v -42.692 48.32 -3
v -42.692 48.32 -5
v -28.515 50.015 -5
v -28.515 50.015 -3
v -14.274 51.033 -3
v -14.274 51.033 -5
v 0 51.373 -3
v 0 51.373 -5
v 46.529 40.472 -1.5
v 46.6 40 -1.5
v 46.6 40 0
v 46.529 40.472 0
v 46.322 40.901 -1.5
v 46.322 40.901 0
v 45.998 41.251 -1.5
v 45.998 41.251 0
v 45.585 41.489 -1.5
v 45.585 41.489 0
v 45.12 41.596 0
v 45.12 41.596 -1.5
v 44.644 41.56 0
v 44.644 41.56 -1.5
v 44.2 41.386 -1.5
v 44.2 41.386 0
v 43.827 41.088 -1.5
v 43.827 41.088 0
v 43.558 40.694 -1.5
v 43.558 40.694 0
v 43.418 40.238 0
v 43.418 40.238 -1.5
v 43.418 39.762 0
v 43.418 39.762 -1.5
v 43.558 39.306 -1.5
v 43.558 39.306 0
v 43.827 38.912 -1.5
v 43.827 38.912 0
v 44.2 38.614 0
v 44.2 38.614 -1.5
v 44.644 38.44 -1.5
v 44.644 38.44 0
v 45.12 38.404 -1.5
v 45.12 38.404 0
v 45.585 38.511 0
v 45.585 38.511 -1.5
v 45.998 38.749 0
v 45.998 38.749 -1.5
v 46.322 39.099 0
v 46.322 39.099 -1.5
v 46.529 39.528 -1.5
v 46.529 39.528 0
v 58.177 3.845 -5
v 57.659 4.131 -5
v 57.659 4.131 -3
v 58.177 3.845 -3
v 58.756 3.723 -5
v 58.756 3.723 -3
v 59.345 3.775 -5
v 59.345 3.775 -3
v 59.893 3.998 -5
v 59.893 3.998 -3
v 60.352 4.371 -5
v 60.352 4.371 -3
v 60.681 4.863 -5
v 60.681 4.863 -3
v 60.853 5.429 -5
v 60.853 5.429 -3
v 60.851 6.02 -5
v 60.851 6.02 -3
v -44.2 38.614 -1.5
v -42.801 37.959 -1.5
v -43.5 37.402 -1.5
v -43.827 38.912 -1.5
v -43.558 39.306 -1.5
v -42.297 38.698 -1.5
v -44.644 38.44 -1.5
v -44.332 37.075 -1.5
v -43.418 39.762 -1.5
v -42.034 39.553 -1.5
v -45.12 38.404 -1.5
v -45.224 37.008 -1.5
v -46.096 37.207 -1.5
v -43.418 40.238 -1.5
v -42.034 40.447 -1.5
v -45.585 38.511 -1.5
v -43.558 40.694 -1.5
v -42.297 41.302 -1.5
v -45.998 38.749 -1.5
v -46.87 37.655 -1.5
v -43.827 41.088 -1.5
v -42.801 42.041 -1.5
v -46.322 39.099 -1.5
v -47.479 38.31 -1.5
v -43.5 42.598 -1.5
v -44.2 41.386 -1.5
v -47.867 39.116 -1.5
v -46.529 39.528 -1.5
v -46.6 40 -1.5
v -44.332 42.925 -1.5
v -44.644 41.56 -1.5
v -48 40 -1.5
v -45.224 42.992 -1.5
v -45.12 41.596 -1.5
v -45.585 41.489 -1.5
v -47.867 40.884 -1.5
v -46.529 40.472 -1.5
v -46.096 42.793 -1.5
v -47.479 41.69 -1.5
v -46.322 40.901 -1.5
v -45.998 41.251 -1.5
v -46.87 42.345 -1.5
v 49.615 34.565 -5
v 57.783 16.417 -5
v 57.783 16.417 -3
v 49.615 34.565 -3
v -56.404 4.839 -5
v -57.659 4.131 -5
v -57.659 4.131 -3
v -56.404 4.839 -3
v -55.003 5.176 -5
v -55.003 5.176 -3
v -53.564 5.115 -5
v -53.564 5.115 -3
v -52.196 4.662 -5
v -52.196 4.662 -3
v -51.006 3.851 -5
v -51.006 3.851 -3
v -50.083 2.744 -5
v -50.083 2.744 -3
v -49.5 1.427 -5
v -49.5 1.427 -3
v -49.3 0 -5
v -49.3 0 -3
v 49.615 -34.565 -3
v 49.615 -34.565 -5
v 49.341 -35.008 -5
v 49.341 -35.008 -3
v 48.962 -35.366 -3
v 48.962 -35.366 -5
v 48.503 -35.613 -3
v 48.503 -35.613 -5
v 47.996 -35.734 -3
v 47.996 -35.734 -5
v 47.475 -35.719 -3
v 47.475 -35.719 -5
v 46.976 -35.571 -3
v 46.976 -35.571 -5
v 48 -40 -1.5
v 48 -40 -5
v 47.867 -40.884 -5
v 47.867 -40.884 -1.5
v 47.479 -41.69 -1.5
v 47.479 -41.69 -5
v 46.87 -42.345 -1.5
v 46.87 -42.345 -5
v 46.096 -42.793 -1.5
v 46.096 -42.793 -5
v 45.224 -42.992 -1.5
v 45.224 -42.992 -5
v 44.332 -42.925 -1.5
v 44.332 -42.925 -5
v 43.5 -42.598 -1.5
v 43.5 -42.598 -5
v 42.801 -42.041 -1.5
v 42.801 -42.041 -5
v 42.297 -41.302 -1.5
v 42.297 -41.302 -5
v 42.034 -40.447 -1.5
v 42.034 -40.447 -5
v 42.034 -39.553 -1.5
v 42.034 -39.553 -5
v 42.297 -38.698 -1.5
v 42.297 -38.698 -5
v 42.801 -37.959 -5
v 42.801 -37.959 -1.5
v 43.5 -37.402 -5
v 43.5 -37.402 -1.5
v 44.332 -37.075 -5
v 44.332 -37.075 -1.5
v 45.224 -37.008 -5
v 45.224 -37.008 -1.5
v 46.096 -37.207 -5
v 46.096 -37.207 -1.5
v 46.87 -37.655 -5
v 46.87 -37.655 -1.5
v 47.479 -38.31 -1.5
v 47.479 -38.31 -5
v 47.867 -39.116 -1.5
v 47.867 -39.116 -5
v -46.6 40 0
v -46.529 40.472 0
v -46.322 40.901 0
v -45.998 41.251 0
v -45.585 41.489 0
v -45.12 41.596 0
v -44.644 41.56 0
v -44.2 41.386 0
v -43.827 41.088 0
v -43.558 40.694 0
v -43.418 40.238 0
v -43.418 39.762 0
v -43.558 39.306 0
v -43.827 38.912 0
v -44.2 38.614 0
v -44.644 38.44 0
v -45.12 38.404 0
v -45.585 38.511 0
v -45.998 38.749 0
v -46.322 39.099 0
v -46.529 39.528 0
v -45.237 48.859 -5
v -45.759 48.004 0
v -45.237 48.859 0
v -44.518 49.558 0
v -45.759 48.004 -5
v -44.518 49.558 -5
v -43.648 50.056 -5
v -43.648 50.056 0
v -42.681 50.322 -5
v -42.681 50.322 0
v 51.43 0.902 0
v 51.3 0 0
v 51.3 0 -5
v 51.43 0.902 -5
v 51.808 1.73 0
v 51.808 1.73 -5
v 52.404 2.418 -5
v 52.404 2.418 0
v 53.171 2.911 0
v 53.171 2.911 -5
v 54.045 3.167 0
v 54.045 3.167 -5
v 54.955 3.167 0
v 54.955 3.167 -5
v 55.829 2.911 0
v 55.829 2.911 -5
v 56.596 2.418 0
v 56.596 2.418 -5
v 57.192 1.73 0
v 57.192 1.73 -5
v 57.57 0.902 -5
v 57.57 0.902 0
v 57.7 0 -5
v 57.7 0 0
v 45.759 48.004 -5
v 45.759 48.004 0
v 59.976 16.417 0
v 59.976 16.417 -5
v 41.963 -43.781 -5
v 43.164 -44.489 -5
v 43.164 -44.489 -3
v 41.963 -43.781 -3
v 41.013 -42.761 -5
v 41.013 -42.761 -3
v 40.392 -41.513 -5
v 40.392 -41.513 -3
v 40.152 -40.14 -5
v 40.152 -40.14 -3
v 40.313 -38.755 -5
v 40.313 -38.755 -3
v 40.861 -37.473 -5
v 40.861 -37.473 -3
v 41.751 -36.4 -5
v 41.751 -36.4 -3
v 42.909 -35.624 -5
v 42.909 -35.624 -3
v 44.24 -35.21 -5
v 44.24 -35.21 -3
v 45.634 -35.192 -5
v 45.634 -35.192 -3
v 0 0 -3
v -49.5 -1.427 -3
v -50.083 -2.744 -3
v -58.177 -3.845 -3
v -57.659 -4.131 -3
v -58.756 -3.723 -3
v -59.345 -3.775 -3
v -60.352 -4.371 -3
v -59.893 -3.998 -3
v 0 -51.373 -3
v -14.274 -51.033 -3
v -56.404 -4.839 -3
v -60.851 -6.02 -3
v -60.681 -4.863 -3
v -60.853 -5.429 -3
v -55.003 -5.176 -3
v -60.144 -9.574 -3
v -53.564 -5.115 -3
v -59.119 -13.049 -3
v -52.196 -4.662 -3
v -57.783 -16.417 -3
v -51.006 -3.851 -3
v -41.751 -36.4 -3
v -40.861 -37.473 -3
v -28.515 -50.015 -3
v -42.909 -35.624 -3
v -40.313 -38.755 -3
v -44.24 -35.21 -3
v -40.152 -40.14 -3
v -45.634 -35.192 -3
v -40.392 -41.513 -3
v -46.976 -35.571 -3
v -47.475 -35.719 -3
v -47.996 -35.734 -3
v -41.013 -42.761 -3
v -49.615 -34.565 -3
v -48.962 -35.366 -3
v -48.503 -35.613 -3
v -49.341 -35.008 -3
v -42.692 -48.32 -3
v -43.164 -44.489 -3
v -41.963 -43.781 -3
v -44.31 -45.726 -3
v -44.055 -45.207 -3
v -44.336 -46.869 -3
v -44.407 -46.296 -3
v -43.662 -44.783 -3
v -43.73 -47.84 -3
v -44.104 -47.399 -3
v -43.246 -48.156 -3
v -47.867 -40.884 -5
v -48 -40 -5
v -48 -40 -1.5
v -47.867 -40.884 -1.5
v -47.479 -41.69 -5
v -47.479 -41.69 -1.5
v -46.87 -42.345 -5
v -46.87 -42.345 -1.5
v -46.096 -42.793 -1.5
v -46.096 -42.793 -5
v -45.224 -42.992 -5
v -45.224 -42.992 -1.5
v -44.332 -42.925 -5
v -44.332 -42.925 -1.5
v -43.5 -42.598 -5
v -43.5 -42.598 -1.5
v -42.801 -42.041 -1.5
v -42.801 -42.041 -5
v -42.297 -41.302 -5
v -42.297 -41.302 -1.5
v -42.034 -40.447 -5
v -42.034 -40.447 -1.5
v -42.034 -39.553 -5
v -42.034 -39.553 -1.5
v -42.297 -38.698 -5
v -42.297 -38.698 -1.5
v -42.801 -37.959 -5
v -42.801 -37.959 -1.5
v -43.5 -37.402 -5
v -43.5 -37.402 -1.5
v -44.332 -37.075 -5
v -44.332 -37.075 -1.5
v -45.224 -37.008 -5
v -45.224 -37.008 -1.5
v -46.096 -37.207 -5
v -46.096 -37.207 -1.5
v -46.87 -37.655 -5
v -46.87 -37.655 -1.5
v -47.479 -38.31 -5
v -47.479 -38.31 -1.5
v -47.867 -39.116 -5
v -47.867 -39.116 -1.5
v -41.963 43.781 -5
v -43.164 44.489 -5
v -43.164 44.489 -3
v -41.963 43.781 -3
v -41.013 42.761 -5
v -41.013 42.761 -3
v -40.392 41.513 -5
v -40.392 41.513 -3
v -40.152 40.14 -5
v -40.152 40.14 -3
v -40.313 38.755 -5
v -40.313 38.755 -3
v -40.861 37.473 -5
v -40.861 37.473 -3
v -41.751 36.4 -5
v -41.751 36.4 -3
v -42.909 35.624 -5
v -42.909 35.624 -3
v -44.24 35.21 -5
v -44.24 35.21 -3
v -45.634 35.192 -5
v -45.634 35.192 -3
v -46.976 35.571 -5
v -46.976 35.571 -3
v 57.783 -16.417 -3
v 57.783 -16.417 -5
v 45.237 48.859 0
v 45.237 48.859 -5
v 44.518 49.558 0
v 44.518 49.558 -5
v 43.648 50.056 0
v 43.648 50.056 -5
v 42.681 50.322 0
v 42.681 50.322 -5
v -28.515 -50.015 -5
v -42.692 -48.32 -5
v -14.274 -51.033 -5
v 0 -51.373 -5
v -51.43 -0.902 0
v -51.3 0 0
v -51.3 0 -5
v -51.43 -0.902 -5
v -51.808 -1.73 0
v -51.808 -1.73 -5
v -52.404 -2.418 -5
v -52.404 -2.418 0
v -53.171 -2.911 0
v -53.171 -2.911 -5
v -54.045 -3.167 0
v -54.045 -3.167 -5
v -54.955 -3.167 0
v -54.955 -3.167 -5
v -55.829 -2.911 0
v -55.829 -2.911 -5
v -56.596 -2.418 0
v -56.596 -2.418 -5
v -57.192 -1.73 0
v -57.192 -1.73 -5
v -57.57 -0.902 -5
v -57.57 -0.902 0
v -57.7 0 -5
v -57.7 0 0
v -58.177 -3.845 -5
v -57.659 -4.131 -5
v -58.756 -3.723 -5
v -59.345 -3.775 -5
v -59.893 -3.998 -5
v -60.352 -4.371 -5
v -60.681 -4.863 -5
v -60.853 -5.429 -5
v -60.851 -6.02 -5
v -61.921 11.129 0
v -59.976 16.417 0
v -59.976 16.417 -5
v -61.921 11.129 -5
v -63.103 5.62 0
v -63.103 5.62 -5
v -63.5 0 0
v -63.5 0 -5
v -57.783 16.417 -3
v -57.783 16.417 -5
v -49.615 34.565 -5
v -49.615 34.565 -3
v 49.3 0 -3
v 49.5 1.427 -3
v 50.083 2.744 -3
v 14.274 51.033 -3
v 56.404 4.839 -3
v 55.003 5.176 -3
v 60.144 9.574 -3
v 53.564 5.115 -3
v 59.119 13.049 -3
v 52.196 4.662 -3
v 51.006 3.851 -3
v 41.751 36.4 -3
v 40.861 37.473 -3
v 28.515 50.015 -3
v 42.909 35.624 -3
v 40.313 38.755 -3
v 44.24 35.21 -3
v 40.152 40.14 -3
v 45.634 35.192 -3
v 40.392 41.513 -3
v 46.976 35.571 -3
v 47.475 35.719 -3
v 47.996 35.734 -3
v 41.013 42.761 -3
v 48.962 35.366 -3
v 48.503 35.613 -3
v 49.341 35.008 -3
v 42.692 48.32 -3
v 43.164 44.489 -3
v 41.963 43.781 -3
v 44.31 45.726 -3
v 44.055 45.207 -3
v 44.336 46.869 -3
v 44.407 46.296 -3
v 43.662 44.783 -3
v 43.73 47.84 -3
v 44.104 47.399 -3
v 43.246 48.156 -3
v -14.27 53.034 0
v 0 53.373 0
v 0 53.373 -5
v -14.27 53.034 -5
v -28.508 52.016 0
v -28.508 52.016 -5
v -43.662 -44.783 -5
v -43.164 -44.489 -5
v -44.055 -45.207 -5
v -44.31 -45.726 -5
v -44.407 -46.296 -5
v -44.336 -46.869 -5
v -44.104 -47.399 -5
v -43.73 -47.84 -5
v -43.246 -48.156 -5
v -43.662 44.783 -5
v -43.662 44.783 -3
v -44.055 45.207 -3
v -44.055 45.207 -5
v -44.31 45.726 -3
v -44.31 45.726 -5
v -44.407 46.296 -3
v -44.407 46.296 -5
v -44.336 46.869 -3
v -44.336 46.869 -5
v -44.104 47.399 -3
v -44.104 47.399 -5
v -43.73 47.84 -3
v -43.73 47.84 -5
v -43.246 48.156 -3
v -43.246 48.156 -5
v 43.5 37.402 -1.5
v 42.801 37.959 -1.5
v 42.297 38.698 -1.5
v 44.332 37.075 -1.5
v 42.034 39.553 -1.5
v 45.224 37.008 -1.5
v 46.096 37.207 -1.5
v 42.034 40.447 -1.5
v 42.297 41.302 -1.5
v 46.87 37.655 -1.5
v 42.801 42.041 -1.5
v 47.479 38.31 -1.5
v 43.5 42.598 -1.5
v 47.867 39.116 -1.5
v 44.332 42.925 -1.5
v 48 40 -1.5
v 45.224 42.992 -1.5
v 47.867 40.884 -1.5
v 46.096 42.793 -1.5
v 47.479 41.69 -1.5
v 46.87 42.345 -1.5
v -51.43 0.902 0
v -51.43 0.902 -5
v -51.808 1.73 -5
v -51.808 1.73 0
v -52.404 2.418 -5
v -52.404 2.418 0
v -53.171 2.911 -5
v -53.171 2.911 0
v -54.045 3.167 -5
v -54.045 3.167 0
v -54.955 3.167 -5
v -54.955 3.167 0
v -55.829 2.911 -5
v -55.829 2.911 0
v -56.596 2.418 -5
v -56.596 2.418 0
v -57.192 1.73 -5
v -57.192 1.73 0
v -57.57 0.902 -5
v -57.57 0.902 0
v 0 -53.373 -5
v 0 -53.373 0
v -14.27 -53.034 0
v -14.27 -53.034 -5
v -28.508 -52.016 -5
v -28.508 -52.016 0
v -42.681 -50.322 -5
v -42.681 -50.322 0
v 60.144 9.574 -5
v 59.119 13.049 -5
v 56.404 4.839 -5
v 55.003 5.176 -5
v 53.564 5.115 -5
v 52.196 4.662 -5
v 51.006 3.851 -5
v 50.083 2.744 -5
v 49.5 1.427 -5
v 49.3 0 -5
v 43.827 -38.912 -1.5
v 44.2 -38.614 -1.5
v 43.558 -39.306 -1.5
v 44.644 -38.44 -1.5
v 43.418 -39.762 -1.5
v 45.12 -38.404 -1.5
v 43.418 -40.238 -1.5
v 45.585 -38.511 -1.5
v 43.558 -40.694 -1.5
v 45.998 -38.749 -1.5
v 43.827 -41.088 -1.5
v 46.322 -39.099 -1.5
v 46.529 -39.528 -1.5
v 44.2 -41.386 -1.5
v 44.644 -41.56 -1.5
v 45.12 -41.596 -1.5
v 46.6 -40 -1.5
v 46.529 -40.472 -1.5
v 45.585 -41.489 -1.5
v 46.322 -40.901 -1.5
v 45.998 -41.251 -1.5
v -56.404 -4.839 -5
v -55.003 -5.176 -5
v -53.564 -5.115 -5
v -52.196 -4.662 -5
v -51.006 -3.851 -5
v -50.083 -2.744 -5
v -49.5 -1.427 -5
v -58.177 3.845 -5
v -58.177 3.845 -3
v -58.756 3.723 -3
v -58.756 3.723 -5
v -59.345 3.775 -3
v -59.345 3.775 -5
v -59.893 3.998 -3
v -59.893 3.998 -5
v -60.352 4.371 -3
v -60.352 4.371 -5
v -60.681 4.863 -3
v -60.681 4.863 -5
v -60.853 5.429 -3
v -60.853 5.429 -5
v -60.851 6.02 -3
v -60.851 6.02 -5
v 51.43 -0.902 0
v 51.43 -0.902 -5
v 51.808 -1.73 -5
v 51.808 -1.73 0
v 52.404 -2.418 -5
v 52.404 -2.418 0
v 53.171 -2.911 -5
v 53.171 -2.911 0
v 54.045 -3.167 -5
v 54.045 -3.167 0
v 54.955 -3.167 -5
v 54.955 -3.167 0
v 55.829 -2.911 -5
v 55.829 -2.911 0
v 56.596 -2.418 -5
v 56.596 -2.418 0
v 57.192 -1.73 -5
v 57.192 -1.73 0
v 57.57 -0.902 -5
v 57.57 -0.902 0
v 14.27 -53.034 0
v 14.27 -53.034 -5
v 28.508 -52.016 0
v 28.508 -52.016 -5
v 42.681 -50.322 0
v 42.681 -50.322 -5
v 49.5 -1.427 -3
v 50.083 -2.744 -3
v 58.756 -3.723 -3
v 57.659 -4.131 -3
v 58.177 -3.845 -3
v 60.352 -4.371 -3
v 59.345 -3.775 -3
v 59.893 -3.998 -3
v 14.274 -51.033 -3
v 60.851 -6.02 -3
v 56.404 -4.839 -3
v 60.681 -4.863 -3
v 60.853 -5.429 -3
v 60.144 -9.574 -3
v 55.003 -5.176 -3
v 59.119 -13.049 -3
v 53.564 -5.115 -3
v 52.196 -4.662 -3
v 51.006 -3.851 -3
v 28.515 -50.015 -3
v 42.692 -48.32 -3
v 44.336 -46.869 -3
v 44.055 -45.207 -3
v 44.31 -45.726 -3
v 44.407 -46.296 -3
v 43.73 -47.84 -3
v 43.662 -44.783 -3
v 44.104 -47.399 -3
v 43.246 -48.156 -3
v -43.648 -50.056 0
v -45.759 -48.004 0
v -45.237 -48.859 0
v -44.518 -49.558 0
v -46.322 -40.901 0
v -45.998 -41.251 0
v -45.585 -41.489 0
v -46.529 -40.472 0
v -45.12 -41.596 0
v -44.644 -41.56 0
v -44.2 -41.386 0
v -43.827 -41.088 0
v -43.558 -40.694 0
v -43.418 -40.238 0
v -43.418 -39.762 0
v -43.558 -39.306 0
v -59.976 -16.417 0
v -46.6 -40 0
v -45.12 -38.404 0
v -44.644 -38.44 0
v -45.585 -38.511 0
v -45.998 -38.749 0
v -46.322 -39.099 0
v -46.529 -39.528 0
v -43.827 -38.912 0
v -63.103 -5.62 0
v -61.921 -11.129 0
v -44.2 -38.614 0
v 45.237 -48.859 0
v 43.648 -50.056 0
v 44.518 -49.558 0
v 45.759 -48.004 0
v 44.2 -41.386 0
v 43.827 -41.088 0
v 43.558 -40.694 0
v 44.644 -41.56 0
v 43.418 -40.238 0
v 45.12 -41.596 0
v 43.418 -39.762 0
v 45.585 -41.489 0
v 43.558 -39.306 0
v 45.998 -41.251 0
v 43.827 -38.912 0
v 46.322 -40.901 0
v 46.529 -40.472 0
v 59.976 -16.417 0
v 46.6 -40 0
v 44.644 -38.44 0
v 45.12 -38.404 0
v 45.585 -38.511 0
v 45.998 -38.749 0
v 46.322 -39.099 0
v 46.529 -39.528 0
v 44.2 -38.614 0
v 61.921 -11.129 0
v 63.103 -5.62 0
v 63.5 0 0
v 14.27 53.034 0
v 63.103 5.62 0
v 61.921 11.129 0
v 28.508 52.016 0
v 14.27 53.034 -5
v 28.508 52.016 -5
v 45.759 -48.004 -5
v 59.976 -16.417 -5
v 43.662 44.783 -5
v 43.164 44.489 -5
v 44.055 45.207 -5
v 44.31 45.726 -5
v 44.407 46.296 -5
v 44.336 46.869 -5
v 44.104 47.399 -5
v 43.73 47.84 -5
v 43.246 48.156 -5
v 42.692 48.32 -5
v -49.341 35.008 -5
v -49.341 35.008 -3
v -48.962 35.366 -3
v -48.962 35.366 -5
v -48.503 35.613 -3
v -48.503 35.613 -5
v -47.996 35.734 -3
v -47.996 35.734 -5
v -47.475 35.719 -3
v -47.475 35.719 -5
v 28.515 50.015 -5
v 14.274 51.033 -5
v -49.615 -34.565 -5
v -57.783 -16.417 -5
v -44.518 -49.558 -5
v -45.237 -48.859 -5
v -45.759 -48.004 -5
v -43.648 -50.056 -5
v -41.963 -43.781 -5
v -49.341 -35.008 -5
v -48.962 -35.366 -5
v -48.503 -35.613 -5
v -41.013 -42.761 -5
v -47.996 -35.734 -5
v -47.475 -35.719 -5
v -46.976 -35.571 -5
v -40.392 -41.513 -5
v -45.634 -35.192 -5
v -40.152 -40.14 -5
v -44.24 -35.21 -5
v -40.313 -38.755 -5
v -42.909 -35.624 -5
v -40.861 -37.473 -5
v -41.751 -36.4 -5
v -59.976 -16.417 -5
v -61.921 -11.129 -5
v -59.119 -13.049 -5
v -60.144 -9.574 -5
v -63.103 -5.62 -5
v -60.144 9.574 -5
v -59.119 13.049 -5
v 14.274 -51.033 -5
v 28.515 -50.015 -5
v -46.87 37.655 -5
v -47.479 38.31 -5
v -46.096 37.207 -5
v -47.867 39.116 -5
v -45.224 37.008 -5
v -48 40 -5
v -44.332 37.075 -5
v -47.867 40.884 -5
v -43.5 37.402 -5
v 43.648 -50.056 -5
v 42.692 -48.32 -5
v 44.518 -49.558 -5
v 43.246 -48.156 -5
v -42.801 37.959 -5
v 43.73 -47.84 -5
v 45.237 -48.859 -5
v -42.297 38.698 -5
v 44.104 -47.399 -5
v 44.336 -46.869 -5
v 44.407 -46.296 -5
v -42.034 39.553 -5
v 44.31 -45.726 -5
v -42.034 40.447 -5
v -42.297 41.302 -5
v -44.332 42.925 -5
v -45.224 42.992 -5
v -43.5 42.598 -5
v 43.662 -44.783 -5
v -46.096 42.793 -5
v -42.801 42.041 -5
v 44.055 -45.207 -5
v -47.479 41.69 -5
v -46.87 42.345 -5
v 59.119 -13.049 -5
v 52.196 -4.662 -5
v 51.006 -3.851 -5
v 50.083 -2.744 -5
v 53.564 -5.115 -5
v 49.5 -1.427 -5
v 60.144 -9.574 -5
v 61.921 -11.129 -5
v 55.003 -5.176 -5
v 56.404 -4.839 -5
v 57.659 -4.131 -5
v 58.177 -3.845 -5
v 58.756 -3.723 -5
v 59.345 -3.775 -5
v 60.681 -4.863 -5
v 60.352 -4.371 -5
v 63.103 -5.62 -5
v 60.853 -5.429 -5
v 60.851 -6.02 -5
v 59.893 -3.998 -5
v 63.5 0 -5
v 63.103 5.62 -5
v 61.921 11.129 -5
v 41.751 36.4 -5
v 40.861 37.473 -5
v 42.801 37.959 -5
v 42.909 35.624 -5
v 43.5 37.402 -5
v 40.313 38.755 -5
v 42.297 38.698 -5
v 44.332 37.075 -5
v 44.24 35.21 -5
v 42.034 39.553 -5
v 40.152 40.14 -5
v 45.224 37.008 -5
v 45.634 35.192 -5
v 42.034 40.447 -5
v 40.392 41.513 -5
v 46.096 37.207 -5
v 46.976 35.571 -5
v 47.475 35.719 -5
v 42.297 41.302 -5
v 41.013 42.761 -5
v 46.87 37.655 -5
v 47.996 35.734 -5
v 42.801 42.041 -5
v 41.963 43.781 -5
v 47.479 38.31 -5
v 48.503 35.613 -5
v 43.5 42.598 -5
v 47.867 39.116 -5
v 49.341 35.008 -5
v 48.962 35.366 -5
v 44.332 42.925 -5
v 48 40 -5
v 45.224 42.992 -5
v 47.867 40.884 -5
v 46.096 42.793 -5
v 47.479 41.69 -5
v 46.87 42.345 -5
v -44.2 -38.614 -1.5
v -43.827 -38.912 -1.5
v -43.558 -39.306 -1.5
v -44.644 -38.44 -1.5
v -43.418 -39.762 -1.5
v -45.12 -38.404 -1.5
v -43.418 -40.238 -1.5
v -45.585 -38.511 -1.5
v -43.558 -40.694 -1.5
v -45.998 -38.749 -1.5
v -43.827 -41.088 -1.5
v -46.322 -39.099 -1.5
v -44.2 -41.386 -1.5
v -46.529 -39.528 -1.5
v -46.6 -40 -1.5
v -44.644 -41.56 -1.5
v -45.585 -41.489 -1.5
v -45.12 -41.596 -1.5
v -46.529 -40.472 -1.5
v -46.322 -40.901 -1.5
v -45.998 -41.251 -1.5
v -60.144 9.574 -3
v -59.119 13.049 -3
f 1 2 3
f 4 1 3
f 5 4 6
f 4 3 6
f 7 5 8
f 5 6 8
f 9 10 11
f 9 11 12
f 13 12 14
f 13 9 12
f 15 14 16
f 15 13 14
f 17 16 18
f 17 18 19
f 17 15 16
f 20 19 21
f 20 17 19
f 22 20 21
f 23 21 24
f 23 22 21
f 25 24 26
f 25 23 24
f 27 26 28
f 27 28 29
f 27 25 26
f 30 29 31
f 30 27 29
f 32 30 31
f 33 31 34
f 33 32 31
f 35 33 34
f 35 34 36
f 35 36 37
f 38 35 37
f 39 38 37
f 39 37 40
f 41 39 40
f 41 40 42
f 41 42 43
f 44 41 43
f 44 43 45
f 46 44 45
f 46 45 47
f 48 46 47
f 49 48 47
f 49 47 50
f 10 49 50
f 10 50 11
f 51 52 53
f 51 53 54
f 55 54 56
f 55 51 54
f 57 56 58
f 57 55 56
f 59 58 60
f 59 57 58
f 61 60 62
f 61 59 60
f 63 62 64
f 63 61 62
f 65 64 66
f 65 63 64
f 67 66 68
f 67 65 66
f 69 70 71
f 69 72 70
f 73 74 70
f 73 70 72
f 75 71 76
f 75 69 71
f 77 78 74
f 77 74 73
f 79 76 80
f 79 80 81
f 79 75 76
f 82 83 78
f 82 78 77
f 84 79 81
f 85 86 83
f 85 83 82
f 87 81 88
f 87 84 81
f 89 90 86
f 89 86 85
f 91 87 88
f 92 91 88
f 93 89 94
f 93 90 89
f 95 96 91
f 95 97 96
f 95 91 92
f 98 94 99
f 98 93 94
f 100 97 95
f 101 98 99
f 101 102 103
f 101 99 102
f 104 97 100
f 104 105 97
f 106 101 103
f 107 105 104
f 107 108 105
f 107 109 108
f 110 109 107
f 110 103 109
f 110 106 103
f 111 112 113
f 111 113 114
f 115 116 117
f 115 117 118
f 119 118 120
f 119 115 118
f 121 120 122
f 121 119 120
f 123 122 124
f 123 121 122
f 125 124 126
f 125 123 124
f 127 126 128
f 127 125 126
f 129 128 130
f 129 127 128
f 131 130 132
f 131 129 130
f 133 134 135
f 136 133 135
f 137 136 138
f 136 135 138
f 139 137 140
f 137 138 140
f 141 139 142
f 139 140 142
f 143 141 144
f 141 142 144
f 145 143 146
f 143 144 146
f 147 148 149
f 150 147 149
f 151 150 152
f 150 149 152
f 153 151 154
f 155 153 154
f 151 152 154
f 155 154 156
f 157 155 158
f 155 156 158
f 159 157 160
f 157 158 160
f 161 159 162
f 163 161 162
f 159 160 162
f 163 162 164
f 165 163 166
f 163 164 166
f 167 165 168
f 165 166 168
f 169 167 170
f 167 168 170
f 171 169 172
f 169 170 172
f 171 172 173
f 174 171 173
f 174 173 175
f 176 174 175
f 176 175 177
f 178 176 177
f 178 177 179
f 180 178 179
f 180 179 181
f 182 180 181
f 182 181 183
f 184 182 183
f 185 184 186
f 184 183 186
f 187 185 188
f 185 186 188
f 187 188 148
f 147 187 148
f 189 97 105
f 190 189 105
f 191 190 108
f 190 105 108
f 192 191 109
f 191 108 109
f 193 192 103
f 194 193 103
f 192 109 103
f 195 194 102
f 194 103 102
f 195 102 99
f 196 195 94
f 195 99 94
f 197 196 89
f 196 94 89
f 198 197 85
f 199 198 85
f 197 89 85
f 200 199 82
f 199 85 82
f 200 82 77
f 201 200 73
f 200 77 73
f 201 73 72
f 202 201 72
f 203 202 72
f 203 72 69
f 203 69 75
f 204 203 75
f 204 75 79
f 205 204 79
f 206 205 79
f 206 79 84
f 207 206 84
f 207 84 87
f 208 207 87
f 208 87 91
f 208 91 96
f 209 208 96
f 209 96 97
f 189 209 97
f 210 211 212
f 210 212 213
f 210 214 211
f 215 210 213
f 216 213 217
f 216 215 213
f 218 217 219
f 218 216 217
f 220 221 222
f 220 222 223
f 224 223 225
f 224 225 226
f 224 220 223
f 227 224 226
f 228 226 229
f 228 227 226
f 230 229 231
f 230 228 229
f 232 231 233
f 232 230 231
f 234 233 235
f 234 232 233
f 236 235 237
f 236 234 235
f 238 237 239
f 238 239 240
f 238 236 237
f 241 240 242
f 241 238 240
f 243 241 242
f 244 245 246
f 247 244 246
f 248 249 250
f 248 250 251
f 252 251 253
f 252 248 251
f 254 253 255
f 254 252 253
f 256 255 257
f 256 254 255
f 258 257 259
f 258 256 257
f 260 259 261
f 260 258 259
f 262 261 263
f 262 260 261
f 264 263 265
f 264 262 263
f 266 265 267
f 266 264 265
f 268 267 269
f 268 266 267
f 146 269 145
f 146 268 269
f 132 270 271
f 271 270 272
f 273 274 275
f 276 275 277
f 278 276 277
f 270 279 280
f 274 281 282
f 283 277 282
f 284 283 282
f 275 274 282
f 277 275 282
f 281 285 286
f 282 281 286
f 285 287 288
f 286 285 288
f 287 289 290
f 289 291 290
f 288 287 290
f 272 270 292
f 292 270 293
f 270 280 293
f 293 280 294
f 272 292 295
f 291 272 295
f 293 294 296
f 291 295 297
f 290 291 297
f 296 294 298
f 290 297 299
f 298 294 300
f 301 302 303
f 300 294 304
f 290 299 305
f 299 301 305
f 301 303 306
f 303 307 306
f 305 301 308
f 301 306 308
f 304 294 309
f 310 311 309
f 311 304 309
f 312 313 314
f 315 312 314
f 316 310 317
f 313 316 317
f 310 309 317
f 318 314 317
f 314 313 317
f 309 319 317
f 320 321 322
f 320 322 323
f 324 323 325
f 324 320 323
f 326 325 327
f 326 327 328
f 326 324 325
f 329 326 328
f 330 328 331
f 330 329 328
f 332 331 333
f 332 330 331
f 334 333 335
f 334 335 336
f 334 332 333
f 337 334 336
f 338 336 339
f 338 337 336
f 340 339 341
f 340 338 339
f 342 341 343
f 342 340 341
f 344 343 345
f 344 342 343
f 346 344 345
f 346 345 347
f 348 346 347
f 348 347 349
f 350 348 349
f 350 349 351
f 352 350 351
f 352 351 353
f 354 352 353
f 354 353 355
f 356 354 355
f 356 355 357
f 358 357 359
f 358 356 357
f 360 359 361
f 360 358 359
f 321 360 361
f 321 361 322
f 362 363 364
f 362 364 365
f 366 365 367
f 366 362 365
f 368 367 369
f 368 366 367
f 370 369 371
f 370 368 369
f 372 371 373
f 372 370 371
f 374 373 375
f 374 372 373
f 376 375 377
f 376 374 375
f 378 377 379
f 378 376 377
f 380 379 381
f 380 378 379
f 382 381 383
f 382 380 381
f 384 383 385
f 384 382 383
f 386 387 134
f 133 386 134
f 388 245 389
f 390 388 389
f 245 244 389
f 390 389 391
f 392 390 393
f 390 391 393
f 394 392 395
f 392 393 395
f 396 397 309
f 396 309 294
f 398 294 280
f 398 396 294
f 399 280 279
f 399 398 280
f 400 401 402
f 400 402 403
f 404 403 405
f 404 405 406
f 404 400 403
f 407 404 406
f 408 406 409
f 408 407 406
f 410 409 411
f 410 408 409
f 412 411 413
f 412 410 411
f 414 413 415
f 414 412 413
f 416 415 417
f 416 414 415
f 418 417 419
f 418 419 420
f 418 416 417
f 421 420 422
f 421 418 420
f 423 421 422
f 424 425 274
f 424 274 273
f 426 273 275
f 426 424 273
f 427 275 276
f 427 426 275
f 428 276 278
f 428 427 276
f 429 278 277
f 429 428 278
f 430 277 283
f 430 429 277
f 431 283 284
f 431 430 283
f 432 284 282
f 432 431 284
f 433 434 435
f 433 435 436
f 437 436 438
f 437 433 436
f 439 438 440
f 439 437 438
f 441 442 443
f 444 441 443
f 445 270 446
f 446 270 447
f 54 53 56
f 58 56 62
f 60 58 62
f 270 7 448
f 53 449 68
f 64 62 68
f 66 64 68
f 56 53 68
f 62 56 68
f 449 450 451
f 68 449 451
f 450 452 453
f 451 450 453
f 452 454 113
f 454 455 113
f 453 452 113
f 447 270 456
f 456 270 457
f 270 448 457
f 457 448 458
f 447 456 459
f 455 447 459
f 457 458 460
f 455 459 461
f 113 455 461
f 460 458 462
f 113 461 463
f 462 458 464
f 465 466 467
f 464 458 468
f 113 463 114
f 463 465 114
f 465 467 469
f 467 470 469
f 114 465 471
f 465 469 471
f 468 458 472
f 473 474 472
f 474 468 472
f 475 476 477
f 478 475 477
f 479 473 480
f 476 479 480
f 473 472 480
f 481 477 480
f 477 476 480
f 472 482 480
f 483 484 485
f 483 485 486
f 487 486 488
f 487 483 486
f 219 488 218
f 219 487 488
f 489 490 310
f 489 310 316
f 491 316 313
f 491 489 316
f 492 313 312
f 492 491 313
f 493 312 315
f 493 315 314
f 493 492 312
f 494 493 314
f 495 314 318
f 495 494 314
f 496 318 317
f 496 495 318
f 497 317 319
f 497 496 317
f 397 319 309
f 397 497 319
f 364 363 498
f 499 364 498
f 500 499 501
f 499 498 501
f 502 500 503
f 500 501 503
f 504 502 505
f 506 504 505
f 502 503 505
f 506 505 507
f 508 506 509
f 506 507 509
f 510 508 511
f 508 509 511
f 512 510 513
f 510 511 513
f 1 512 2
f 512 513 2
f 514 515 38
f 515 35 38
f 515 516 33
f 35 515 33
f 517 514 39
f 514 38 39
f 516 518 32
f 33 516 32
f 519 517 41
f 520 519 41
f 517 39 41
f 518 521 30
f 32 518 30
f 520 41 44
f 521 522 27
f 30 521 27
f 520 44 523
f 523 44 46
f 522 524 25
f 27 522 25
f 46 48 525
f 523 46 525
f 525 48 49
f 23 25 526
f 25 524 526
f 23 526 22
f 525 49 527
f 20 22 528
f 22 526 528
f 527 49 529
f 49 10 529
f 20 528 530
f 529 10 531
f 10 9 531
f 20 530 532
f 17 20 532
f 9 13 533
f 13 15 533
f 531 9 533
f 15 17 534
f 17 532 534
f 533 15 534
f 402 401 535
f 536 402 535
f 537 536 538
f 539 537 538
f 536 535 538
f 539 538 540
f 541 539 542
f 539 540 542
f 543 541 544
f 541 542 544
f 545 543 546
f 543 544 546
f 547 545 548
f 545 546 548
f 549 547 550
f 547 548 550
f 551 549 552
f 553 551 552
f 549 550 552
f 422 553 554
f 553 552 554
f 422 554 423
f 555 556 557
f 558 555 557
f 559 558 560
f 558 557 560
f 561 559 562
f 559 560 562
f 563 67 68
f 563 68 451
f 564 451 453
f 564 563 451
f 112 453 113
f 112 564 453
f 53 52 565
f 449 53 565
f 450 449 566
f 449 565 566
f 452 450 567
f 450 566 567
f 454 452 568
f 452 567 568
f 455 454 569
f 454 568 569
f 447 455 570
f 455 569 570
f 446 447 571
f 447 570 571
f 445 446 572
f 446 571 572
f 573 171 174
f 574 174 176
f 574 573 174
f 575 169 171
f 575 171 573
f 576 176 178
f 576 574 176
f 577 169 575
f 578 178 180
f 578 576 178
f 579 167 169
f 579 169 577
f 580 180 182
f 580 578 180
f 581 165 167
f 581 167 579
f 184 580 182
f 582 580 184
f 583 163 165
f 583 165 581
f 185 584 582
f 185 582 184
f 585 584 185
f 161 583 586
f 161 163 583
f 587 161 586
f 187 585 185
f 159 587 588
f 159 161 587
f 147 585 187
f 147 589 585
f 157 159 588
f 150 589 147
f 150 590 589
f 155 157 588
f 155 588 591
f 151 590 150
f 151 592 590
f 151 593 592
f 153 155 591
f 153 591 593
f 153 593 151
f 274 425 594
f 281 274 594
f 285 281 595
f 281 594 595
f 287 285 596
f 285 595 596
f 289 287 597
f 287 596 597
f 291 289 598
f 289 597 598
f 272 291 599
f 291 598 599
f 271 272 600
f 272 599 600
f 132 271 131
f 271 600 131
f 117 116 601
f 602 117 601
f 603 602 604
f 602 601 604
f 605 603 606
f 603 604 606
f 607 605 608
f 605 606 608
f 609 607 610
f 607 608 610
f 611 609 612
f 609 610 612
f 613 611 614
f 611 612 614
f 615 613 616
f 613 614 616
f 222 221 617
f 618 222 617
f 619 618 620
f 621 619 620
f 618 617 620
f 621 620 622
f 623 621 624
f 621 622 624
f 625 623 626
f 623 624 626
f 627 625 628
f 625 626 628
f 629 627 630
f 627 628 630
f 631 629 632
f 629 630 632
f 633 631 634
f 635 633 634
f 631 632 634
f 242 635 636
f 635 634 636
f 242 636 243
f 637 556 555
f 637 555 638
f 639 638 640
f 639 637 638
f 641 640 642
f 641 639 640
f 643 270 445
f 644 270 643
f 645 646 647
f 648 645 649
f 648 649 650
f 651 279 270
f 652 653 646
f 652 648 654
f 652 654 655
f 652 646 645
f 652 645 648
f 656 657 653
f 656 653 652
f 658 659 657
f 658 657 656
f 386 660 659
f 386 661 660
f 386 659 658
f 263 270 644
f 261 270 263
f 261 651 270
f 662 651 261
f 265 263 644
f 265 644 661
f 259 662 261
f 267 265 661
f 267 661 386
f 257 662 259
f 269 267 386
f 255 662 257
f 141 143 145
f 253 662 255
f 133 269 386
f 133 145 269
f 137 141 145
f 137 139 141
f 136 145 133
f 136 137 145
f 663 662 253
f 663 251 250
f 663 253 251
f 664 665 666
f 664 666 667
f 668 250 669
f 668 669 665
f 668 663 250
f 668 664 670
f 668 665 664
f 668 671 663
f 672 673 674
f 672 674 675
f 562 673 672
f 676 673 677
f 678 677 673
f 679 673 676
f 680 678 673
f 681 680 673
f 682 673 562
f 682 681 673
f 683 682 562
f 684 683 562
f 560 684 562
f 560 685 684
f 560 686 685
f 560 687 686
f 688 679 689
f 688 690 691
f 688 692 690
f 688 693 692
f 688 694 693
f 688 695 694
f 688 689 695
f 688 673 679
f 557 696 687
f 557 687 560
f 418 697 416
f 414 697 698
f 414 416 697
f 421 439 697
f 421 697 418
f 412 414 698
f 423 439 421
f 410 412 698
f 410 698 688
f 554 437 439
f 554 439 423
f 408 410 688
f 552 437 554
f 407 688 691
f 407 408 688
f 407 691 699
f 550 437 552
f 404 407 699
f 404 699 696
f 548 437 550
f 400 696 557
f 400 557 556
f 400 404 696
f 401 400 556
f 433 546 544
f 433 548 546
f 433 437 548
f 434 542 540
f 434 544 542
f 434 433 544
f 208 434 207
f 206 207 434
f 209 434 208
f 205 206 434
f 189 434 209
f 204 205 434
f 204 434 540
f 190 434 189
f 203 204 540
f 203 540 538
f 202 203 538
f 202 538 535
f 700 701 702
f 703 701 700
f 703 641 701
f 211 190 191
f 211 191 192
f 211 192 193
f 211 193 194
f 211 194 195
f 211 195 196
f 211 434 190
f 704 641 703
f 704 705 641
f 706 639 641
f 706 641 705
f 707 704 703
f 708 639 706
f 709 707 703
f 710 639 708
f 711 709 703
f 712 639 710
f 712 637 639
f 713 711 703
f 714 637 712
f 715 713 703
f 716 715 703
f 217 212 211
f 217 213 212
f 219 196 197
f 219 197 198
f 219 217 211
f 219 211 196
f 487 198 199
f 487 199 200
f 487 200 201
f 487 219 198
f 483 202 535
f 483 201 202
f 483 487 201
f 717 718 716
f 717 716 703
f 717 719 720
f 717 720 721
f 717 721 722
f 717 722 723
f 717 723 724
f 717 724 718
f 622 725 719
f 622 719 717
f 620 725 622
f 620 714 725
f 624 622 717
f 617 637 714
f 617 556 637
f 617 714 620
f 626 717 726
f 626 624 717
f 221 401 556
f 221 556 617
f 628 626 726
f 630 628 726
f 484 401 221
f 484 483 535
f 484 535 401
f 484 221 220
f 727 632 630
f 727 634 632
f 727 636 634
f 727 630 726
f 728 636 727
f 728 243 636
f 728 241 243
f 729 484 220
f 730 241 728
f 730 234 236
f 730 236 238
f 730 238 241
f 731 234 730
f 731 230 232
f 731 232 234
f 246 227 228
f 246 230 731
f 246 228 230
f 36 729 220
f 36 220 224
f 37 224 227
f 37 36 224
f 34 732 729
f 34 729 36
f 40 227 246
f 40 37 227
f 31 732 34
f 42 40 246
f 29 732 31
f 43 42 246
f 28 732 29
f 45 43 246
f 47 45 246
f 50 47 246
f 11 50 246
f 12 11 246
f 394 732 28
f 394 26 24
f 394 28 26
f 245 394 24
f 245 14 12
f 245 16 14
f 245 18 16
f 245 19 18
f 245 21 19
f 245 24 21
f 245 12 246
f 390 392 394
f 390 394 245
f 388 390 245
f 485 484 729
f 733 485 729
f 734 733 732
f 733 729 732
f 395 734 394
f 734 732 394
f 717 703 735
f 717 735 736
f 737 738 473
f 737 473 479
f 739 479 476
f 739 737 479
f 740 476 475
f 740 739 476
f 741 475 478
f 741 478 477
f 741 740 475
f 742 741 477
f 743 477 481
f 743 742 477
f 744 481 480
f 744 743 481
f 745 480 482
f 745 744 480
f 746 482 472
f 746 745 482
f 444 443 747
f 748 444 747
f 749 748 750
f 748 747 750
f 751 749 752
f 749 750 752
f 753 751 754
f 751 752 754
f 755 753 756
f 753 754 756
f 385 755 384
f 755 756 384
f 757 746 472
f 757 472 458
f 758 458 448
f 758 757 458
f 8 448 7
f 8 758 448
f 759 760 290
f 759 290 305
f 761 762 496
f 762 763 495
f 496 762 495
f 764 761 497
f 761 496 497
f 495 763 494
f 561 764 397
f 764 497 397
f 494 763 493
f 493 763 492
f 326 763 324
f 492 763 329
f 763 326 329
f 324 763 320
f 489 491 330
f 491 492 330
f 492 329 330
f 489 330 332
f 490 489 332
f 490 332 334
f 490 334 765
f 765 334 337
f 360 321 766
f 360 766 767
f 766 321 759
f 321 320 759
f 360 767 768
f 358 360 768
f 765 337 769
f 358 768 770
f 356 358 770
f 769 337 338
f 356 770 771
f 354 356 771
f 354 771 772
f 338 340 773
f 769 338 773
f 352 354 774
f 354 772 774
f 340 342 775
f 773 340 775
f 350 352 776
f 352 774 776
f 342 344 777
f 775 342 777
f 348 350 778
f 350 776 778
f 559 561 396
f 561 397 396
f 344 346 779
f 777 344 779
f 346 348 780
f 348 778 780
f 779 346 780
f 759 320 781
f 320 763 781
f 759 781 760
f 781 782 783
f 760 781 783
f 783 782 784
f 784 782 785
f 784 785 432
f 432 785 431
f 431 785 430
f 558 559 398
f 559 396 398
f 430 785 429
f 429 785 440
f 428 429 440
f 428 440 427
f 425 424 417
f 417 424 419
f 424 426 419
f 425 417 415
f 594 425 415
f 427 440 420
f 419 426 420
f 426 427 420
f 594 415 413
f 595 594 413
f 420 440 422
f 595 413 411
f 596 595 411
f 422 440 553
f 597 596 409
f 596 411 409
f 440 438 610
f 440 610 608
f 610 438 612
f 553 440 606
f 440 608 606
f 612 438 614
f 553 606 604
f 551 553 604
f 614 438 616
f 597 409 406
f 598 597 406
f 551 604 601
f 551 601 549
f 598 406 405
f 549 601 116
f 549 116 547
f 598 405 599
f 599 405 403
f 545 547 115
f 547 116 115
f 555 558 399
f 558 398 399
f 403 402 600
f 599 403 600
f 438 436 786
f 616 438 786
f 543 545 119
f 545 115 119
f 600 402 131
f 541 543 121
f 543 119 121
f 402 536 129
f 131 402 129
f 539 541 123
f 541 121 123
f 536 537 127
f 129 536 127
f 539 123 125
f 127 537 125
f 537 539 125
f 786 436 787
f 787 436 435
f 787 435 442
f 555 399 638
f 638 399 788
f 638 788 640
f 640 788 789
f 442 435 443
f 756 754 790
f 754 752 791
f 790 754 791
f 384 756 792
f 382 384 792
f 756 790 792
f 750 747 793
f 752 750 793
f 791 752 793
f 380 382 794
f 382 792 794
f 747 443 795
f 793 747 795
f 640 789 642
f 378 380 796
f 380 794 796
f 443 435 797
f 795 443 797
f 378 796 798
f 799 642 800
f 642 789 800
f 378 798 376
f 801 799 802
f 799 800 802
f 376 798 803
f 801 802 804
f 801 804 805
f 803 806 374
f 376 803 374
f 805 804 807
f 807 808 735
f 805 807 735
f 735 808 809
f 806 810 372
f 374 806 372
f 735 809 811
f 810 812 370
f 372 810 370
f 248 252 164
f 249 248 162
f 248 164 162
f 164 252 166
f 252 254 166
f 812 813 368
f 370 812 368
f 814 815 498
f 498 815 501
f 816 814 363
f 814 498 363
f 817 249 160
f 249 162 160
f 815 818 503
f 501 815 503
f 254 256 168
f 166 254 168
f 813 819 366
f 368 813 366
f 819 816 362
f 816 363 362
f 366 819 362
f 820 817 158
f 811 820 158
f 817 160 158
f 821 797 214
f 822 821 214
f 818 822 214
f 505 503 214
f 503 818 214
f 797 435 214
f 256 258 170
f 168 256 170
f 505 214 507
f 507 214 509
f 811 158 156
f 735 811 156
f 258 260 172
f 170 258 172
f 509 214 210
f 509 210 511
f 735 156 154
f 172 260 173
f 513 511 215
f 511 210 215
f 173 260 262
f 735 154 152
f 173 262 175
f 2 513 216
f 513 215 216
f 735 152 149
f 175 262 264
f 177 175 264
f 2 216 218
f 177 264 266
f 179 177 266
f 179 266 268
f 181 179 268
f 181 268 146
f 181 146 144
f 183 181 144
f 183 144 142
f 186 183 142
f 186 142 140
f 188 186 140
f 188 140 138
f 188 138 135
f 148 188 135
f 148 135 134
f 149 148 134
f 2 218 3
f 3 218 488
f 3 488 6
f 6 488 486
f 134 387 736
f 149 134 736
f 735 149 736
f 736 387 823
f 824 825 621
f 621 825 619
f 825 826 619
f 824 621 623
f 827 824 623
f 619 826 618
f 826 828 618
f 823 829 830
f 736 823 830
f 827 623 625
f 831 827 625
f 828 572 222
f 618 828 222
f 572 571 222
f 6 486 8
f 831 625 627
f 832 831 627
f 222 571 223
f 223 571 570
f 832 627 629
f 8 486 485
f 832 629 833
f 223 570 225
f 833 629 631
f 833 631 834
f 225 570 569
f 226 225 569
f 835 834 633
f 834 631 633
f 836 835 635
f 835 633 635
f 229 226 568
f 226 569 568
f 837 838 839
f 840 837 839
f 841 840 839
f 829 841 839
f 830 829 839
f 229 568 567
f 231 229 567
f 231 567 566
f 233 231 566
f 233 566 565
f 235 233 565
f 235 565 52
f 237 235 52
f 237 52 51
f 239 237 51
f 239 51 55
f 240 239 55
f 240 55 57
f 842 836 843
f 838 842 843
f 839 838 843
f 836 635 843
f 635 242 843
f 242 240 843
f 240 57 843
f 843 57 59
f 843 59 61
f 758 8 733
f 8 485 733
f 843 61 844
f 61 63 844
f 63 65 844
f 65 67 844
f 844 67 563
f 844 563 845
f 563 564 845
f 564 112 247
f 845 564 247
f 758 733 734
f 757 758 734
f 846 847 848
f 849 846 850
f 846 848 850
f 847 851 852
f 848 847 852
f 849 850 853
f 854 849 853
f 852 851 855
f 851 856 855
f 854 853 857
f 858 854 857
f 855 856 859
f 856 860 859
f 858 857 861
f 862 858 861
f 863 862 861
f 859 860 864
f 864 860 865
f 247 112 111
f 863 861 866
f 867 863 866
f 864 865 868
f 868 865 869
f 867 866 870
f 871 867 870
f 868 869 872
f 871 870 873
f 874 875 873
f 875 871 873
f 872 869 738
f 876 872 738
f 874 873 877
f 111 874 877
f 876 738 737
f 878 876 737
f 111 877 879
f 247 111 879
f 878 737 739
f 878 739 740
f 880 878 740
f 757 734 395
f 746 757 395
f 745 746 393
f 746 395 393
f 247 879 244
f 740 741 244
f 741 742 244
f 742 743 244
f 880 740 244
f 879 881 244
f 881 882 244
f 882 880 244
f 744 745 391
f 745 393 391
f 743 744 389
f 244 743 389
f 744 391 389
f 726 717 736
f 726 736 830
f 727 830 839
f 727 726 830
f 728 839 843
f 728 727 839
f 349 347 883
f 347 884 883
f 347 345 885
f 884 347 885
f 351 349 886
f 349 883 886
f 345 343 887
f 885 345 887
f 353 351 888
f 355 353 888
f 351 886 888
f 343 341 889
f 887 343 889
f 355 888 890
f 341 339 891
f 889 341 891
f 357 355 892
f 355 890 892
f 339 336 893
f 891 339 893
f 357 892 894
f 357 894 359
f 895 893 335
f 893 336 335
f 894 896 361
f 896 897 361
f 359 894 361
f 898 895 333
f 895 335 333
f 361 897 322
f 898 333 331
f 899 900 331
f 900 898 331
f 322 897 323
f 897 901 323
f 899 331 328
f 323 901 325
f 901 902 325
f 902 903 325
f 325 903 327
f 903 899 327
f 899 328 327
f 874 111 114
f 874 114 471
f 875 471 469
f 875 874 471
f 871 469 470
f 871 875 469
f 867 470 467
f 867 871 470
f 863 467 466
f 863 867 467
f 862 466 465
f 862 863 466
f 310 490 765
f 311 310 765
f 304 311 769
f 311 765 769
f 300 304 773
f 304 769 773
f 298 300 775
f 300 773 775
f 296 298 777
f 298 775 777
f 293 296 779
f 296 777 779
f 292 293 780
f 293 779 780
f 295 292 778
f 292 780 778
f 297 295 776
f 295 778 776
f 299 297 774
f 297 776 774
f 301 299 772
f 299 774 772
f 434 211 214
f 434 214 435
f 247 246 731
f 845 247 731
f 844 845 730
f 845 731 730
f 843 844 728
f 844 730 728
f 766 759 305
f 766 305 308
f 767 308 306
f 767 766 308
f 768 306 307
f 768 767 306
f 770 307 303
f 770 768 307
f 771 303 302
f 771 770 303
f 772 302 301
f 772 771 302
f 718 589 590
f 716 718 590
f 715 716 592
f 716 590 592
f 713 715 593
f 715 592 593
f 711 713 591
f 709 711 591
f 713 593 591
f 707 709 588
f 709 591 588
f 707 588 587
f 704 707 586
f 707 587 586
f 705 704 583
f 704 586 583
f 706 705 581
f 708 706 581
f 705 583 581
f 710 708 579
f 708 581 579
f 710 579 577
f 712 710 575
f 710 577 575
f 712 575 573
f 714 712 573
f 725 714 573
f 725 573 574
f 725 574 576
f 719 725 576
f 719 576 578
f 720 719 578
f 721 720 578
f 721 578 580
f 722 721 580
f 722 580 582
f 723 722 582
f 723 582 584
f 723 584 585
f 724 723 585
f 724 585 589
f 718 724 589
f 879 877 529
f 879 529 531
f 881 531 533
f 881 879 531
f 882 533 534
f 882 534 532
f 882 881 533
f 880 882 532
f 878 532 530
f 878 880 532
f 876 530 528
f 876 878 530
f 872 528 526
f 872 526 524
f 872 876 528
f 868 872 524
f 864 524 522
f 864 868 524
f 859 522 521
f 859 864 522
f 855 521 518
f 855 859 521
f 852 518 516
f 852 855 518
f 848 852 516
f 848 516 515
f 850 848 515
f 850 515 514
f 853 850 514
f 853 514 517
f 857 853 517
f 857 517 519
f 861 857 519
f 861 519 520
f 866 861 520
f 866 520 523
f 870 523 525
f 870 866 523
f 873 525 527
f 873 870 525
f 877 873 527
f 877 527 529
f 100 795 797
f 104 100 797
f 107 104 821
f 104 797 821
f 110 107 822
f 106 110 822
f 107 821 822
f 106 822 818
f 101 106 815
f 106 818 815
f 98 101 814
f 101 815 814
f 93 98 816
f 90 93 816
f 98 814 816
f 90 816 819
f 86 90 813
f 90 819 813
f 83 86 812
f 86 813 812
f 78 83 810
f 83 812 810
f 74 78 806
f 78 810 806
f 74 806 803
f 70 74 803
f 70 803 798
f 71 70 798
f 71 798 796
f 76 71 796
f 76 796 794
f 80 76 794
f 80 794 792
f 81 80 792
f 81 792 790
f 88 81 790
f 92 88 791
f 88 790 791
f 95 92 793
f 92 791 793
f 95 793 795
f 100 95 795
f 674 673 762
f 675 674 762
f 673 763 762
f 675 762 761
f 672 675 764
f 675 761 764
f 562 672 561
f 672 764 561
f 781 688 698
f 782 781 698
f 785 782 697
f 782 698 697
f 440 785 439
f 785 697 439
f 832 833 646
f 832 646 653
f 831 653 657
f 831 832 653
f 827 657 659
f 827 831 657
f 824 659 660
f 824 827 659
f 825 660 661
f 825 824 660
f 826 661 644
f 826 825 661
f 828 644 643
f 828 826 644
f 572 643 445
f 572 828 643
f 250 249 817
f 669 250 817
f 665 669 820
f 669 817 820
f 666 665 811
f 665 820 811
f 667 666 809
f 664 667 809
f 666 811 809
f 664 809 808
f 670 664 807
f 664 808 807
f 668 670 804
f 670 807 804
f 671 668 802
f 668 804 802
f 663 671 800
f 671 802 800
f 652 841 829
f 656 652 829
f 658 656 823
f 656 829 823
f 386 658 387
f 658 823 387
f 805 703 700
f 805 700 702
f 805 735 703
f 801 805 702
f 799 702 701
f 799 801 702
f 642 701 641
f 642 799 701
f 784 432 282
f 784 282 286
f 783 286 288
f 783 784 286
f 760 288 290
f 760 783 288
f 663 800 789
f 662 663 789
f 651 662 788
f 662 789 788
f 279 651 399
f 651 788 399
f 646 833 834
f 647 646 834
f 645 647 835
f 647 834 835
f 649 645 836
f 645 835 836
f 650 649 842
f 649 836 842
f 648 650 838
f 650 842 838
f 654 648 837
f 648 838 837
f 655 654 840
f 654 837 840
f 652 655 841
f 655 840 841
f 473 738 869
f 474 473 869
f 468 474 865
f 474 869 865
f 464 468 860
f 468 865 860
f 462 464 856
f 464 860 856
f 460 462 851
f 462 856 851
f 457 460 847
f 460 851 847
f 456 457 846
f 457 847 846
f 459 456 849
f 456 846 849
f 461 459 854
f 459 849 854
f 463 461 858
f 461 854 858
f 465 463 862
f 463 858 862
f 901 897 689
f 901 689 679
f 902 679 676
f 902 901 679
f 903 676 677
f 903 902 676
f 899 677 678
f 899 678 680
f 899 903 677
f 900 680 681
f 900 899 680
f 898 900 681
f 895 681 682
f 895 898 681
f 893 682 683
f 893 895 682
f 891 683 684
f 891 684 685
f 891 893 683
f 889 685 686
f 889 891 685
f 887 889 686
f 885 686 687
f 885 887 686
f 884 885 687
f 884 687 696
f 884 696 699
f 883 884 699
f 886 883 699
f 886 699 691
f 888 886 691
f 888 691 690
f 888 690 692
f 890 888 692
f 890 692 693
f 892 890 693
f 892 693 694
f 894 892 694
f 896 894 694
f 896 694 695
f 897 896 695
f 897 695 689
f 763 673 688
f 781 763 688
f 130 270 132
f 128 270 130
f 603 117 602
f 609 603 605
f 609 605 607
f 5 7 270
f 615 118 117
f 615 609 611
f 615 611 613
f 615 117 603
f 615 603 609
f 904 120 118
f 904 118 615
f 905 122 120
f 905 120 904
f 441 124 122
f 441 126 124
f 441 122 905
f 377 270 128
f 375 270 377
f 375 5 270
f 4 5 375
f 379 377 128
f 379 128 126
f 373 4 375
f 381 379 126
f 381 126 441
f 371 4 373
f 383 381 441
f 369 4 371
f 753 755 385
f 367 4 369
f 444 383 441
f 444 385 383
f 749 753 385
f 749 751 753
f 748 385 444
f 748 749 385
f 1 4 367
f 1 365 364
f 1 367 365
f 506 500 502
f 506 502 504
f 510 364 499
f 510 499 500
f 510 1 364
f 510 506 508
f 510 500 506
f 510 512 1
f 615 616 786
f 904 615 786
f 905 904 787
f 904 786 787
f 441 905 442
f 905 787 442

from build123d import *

# Parameters (mm, degrees)
PAD_DEPTH       = 5
FILLET_R        = 4
POCKET_DEPTH    = 2
SKETCH011_R     = 1.6
POCKET001_DEPTH = 5
SKETCH012_R     = 3
POCKET002_DEPTH = 3.5


with BuildPart() as pocket002:
    # Sketch010 → Pad (new body)
    with BuildSketch(Plane.XY):
        with BuildLine():
            Line((44.86111, -50), (59.975919, -16.416677))
            ThreePointArc((59.975919, -16.416677), (62.609058, -8.395333), (63.5, 0))
            Line((57.7, 0), (63.5, 0))
            ThreePointArc((51.3, 0), (54.5, -3.2), (57.7, 0))
            Line((0, 0), (51.3, 0))
            Line((0, -53.373162), (0, 0))
            ThreePointArc((0, -53.373162), (22.493874, -52.528683), (44.86111, -50))
        make_face()
    extrude(amount=-PAD_DEPTH)

    # Fillet
    fillet_edges = [pocket002.edges().sort_by_distance(p)[0] for p in [
        (44.86111, -50, -2.5),
    ]]
    fillet(fillet_edges, radius=FILLET_R)

    # Sketch (on Face5 of Fillet) → Pocket (cut)
    with BuildSketch(Plane(origin=(0, 0, -5), x_dir=(1, 0, 0), z_dir=(0, 0, -1))):
        with BuildLine():
            ThreePointArc((42.691795, 48.319977), (21.400417, 50.608892), (0, 51.373162))
            Line((0, 0), (0, 51.373162))
            Line((49.3, 0), (0, 0))
            ThreePointArc((57.658949, 4.130502), (52.196365, 4.661895), (49.3, 0))
            ThreePointArc((57.658949, 4.130502), (59.892731, 3.998098), (60.851148, 6.020164))
            ThreePointArc((60.851148, 6.020164), (59.670721, 11.322874), (57.782667, 16.416731))
            Line((57.782667, 16.416731), (49.614632, 34.565141))
            ThreePointArc((49.614632, 34.565141), (48.503106, 35.613174), (46.975994, 35.570785))
            ThreePointArc((43.16421, 44.48914), (40.540272, 38.093872), (46.975994, 35.570785))
            ThreePointArc((43.16421, 44.48914), (44.392147, 46.585115), (42.691795, 48.319977))
        make_face()
    extrude(amount=-POCKET_DEPTH, mode=Mode.SUBTRACT)

    # Sketch011 (on Face5 of Pocket) → Pocket001 (cut)
    with BuildSketch(Plane(origin=(0, 0, -5), x_dir=(1, 0, 0), z_dir=(0, 0, -1))):
        with Locations((45, 40)):
            Circle(SKETCH011_R)
    extrude(amount=-POCKET001_DEPTH, mode=Mode.SUBTRACT)

    # Sketch012 (on Face5 of Pocket001) → Pocket002 (cut)
    with BuildSketch(Plane(origin=(0, 0, -5), x_dir=(1, 0, 0), z_dir=(0, 0, -1))):
        with Locations((45, 40)):
            Circle(SKETCH012_R)
    extrude(amount=-POCKET002_DEPTH, mode=Mode.SUBTRACT)


with BuildPart() as fusion:
    # Part__Mirroring: instance of Pocket002
    add(pocket002.part.mirror(Plane(origin=(0, 0, 0), x_dir=(1, 0, 0), z_dir=(0, 1, 0))))

    # Fusion: union Pocket002
    add(pocket002.part)


with BuildPart() as fusion005:
    # Part__Mirroring001: instance of Fusion
    add(fusion.part.mirror(Plane(origin=(0, 0, 0), x_dir=(0, -1, 0), z_dir=(1, 0, 0))))

    # Fusion005: union Fusion
    add(fusion.part)


solid = fusion005.part
